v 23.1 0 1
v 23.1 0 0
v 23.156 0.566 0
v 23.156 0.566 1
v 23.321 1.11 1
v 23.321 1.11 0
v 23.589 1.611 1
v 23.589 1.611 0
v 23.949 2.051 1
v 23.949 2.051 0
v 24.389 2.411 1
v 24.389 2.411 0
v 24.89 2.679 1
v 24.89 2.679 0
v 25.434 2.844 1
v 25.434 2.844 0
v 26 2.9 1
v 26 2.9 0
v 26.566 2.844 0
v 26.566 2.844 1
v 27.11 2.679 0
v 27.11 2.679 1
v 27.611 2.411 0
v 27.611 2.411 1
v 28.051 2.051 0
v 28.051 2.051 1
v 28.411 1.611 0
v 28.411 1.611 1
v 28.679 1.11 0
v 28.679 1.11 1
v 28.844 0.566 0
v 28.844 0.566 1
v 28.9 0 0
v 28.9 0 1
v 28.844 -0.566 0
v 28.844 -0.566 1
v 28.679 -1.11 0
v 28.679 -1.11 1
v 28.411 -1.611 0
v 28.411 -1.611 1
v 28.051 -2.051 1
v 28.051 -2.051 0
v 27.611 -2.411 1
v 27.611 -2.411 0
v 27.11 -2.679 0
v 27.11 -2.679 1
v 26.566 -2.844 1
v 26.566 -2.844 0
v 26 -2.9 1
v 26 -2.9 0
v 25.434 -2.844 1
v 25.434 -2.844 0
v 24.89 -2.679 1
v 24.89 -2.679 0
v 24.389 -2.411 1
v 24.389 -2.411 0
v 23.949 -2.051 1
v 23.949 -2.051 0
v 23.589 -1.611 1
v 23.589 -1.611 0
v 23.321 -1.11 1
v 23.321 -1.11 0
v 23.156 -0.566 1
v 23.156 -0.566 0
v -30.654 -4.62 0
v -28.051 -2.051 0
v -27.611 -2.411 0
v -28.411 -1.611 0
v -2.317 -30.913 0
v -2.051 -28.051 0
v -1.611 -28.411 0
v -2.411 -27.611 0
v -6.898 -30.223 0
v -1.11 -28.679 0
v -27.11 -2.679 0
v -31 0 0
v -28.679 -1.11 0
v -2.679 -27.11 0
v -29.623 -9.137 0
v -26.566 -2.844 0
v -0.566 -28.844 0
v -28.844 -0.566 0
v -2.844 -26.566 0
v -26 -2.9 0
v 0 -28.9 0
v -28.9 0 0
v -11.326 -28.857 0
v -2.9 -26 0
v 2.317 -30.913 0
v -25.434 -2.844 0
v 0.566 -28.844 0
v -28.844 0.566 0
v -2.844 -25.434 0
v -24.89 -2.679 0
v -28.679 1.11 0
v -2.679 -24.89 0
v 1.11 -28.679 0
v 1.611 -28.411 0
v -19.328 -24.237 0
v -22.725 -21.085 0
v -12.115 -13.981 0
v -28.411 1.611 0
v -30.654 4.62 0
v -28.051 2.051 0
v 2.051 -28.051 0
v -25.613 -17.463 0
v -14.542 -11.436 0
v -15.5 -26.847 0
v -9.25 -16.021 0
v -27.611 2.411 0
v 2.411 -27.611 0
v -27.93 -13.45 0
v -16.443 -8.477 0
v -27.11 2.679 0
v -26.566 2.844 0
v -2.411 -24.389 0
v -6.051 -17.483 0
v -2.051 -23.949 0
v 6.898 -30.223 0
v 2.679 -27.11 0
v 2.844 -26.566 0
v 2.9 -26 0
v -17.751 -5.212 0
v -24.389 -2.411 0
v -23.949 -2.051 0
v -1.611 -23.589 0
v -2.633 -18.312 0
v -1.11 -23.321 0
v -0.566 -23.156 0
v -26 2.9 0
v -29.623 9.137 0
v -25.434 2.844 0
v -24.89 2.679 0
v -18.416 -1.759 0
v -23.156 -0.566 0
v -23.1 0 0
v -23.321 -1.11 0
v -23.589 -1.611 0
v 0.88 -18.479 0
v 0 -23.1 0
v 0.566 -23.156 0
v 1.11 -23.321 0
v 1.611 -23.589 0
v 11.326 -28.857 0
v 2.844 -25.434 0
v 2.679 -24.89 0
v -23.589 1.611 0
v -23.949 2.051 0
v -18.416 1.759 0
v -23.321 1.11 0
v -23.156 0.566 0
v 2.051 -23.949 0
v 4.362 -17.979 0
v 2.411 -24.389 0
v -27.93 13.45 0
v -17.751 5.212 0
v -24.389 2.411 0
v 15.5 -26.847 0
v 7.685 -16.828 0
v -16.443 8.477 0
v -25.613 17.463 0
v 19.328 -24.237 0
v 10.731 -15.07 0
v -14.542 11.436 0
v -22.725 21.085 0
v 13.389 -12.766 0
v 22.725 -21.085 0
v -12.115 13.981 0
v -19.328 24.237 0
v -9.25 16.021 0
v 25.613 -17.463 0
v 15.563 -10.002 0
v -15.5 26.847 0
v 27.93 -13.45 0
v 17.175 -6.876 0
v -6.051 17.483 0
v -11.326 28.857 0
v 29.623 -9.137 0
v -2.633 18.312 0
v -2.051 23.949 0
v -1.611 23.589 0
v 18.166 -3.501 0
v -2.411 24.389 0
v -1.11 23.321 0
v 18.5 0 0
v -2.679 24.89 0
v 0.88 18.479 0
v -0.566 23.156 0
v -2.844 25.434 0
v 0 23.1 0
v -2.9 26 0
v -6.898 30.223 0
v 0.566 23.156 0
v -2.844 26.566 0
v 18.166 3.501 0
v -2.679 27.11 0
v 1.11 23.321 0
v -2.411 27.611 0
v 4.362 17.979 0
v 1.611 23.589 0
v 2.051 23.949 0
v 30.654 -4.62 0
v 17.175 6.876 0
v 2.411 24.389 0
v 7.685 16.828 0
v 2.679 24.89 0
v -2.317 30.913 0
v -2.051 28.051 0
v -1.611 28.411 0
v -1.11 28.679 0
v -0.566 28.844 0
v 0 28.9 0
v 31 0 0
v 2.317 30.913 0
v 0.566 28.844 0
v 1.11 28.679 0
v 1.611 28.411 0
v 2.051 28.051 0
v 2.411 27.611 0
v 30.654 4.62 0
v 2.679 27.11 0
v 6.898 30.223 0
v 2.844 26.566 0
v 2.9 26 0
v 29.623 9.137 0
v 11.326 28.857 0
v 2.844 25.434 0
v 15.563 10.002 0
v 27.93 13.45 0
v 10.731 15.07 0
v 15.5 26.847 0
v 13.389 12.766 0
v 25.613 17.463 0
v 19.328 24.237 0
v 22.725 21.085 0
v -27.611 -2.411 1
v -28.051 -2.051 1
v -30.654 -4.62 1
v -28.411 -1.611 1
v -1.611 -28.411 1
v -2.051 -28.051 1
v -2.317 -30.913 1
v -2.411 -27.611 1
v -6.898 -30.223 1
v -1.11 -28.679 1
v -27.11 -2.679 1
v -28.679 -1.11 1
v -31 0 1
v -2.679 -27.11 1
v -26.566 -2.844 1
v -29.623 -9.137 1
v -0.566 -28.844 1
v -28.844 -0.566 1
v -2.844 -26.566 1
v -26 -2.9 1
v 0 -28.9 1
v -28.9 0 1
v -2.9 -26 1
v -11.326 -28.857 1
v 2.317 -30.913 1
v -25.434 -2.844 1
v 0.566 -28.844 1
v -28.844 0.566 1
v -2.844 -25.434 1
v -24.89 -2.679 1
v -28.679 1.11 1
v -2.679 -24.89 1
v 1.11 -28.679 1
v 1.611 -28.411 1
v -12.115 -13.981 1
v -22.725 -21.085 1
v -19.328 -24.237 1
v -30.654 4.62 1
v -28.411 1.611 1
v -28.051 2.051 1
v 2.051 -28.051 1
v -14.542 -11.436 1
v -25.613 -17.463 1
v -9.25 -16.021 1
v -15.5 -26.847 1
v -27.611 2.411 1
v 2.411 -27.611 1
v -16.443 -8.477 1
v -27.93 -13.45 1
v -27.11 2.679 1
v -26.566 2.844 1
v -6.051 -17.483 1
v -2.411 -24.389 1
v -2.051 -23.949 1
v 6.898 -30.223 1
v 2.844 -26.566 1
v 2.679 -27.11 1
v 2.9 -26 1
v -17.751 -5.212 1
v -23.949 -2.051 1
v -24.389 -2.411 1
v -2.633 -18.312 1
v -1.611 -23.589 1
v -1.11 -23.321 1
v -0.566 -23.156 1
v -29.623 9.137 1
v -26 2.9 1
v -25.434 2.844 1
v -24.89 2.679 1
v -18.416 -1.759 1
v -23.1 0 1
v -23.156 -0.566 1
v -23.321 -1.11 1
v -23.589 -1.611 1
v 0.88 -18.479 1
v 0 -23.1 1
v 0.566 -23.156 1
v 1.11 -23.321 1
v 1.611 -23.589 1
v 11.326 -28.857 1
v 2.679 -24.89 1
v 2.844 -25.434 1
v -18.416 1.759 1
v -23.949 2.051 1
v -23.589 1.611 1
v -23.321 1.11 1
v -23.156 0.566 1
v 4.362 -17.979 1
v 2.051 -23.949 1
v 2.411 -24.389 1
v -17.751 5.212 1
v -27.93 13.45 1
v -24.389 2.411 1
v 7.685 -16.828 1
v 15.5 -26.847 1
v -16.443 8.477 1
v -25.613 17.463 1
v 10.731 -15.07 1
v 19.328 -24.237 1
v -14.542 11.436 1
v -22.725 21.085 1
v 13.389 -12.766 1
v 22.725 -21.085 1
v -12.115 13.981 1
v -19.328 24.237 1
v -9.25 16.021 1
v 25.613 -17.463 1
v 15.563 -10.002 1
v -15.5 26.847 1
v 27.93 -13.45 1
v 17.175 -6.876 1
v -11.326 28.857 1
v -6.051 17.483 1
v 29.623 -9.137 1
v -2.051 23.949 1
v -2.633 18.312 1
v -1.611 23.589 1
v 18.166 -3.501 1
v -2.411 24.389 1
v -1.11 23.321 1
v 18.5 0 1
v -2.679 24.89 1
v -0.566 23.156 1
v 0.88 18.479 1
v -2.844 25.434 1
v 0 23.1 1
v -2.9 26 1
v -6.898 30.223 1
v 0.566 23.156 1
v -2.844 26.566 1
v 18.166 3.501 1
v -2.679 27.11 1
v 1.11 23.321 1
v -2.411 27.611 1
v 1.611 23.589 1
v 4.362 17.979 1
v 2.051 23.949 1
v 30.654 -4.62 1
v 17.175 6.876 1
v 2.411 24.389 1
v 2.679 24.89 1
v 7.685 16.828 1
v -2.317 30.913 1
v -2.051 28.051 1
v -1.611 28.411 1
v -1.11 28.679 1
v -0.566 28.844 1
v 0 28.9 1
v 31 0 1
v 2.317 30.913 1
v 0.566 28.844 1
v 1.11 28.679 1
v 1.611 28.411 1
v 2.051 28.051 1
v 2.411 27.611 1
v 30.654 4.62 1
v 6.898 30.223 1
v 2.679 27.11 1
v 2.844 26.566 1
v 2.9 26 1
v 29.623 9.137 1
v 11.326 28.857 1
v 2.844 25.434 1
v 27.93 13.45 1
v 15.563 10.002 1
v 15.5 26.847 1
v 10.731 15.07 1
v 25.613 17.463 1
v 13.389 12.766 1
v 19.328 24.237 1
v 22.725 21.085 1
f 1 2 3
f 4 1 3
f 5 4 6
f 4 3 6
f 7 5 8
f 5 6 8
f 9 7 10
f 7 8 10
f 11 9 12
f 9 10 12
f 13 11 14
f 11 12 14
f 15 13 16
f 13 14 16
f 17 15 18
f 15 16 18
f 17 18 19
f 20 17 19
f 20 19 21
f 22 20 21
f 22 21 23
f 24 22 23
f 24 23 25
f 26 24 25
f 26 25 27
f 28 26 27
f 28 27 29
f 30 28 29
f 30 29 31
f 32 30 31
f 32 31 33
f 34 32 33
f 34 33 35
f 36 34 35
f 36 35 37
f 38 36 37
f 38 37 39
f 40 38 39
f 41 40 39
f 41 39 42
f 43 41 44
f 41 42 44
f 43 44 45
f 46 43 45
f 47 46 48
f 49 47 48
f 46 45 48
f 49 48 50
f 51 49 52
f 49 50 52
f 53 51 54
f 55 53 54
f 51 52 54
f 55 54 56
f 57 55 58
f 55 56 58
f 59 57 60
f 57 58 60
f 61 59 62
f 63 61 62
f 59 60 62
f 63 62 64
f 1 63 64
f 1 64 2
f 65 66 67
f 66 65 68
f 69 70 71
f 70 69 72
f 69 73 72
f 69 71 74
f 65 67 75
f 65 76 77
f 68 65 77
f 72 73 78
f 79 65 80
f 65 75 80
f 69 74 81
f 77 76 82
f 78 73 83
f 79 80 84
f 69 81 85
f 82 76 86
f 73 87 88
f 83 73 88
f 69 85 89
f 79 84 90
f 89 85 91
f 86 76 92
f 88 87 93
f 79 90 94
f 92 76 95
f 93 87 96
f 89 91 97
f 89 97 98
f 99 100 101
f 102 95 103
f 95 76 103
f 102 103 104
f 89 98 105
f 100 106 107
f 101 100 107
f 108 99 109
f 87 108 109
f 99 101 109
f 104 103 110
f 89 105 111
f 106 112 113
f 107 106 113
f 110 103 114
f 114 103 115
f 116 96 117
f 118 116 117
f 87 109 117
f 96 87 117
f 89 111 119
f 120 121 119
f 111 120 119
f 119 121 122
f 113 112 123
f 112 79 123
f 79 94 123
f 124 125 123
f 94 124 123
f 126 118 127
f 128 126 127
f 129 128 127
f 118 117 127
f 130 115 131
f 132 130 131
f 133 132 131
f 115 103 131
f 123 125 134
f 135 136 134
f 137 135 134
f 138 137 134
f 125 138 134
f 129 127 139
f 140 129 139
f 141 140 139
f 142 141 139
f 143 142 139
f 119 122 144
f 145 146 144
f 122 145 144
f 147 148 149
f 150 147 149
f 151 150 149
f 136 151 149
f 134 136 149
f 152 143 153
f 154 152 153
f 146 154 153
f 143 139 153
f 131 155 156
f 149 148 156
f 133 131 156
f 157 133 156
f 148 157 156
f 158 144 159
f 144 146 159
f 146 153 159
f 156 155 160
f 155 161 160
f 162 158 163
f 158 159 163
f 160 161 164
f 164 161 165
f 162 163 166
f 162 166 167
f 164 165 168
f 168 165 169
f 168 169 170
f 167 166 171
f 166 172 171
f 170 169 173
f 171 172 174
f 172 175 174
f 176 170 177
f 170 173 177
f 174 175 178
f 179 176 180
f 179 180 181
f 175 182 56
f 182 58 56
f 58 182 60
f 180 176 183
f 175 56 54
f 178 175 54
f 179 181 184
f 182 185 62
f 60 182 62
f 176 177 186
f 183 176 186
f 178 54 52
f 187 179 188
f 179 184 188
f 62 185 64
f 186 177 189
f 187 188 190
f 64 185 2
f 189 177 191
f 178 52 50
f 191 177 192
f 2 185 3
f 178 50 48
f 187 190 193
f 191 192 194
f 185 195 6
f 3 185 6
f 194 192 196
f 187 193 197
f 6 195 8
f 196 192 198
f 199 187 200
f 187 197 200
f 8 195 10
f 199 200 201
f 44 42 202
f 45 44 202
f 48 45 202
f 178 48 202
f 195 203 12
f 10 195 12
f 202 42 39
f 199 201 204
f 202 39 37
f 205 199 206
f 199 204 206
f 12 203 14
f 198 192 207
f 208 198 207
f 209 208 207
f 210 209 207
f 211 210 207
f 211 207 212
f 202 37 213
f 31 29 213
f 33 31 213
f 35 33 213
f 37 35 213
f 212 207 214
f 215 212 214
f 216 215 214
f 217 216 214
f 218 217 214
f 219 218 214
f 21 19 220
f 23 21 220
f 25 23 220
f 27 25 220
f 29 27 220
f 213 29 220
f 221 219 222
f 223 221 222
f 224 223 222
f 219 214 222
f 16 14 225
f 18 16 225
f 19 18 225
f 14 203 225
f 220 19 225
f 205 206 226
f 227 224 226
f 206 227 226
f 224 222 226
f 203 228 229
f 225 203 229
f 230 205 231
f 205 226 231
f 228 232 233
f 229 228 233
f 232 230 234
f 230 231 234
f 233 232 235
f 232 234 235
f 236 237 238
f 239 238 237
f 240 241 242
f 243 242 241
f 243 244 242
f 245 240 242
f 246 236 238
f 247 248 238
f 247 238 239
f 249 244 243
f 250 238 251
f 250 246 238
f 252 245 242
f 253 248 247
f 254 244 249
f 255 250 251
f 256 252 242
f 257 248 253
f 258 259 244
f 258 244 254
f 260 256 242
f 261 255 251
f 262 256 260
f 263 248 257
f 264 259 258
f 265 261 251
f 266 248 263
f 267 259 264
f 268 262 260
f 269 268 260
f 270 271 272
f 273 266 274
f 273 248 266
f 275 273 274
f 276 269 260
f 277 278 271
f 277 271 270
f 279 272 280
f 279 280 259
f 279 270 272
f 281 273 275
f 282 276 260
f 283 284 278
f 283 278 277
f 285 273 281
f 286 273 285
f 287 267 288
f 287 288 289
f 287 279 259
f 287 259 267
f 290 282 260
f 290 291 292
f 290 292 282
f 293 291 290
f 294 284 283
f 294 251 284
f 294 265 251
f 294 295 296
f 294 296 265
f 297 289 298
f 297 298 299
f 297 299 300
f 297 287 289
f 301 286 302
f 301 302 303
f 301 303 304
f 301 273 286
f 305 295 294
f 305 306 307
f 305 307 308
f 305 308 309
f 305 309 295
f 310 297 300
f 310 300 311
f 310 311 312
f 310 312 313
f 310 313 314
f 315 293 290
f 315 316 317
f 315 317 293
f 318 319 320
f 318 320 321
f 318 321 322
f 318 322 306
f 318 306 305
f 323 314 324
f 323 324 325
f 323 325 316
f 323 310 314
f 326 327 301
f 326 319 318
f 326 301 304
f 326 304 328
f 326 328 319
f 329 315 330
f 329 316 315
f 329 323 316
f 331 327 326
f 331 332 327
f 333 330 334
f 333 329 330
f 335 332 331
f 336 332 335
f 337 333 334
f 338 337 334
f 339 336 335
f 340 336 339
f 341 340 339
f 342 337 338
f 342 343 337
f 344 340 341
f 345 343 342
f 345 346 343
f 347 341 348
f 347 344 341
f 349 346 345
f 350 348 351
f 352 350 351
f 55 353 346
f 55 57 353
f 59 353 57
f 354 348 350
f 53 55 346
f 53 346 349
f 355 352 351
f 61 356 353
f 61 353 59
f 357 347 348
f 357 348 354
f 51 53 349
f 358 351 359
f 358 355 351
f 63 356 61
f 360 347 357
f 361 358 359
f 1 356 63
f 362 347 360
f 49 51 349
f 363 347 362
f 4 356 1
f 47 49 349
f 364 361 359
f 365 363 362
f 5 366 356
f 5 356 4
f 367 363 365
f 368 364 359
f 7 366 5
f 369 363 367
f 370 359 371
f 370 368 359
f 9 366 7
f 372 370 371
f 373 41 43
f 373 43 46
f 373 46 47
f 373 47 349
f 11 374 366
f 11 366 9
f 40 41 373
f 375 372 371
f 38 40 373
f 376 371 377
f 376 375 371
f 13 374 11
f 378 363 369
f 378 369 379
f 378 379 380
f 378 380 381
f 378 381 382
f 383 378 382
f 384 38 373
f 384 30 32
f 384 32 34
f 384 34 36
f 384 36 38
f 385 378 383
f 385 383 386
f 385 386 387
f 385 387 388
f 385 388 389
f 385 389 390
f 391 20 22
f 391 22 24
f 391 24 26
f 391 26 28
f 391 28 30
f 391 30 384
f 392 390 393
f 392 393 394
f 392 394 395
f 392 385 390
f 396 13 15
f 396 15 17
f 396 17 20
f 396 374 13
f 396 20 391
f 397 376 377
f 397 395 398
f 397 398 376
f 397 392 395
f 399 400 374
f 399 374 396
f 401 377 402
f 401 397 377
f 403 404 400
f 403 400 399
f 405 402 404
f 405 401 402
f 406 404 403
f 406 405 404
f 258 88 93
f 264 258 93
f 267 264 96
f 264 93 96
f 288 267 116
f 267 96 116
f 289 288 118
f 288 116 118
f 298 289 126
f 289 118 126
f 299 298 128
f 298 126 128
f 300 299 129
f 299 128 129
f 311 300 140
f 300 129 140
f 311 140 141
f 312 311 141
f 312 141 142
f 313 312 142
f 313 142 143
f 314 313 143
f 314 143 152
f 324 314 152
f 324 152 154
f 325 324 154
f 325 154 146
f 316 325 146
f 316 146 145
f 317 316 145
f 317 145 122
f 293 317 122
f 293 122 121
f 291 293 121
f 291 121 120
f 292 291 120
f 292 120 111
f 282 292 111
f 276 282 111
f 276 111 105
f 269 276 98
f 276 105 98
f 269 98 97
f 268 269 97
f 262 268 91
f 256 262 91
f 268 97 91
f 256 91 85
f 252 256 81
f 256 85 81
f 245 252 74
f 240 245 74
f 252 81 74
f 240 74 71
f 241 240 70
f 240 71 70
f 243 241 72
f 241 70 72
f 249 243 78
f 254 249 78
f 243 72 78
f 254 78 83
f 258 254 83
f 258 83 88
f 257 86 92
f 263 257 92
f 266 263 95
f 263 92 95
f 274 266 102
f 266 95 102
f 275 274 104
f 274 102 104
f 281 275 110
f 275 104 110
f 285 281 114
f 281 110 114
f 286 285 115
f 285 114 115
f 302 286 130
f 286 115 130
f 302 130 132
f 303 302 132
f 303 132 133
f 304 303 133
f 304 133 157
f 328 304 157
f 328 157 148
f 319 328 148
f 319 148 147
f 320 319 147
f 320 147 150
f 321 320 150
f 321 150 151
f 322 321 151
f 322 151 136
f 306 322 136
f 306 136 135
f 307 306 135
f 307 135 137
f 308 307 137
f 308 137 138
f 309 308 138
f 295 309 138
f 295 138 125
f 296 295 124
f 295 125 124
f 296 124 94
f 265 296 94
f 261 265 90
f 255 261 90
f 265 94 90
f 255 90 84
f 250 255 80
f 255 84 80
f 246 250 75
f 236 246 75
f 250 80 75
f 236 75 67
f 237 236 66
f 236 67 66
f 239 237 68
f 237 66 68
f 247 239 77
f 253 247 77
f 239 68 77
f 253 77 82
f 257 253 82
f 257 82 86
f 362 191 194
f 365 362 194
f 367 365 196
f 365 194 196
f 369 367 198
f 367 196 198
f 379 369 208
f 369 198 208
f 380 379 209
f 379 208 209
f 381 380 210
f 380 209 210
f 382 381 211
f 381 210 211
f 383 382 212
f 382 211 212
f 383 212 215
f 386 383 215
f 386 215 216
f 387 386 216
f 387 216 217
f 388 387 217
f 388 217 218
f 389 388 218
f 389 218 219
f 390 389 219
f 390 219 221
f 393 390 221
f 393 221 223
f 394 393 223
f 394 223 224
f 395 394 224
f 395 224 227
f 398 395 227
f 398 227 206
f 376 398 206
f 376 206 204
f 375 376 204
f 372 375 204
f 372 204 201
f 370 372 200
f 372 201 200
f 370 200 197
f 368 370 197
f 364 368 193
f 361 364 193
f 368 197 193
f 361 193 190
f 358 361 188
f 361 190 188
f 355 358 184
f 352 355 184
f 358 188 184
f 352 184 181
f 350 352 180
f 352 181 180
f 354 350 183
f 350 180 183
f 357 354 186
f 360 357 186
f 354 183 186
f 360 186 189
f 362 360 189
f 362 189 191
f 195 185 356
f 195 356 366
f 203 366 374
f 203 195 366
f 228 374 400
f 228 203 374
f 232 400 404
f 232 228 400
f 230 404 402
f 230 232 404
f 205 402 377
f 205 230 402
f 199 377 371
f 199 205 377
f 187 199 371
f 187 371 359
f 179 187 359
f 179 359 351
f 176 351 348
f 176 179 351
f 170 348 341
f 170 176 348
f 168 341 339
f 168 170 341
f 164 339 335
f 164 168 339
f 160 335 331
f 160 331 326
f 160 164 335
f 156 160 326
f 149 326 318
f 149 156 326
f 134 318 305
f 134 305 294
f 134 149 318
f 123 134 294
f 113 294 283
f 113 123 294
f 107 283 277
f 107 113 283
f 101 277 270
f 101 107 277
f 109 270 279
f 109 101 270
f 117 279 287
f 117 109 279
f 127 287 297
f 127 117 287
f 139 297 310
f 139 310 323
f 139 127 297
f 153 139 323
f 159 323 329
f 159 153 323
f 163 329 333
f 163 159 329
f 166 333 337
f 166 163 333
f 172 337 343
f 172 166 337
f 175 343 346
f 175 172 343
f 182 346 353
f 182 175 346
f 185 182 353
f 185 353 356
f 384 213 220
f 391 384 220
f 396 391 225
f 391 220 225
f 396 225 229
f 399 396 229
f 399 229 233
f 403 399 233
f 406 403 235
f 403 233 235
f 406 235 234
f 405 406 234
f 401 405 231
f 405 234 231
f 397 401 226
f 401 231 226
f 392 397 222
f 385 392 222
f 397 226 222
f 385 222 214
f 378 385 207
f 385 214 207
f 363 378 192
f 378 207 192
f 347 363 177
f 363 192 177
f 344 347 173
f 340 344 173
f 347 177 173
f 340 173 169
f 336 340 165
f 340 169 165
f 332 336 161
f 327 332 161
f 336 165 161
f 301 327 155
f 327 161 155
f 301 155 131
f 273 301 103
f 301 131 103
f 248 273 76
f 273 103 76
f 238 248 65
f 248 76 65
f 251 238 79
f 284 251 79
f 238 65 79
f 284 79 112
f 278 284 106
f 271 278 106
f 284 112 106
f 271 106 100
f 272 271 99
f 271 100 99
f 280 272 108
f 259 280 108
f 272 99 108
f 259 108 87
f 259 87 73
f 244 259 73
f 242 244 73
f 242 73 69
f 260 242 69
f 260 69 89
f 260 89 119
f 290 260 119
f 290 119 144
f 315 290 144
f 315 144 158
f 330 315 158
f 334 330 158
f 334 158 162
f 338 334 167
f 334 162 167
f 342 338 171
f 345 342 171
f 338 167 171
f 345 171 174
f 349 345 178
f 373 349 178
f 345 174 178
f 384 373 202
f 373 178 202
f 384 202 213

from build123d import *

# Parameters (mm, degrees)
SKETCH1_R            = 31
SKETCH1_R_2          = 18.5
BOSS_EXTRUDE1_DEPTH  = 1
M5_CLEARANCE_HOLE1_D = 5.8


with BuildPart() as part:
    # Sketch1 → Boss-Extrude1 (new body)
    with BuildSketch(Plane.XY):
        Circle(SKETCH1_R)
        Circle(SKETCH1_R_2, mode=Mode.SUBTRACT)
    extrude(amount=BOSS_EXTRUDE1_DEPTH)

    # M5 Clearance Hole1 (through all)
    with Locations(Plane.XY.offset(1)):
        with Locations((26, 0), (0, 26), (-26, 0), (0, -26)):
            Hole(M5_CLEARANCE_HOLE1_D / 2)


solid = part.part
